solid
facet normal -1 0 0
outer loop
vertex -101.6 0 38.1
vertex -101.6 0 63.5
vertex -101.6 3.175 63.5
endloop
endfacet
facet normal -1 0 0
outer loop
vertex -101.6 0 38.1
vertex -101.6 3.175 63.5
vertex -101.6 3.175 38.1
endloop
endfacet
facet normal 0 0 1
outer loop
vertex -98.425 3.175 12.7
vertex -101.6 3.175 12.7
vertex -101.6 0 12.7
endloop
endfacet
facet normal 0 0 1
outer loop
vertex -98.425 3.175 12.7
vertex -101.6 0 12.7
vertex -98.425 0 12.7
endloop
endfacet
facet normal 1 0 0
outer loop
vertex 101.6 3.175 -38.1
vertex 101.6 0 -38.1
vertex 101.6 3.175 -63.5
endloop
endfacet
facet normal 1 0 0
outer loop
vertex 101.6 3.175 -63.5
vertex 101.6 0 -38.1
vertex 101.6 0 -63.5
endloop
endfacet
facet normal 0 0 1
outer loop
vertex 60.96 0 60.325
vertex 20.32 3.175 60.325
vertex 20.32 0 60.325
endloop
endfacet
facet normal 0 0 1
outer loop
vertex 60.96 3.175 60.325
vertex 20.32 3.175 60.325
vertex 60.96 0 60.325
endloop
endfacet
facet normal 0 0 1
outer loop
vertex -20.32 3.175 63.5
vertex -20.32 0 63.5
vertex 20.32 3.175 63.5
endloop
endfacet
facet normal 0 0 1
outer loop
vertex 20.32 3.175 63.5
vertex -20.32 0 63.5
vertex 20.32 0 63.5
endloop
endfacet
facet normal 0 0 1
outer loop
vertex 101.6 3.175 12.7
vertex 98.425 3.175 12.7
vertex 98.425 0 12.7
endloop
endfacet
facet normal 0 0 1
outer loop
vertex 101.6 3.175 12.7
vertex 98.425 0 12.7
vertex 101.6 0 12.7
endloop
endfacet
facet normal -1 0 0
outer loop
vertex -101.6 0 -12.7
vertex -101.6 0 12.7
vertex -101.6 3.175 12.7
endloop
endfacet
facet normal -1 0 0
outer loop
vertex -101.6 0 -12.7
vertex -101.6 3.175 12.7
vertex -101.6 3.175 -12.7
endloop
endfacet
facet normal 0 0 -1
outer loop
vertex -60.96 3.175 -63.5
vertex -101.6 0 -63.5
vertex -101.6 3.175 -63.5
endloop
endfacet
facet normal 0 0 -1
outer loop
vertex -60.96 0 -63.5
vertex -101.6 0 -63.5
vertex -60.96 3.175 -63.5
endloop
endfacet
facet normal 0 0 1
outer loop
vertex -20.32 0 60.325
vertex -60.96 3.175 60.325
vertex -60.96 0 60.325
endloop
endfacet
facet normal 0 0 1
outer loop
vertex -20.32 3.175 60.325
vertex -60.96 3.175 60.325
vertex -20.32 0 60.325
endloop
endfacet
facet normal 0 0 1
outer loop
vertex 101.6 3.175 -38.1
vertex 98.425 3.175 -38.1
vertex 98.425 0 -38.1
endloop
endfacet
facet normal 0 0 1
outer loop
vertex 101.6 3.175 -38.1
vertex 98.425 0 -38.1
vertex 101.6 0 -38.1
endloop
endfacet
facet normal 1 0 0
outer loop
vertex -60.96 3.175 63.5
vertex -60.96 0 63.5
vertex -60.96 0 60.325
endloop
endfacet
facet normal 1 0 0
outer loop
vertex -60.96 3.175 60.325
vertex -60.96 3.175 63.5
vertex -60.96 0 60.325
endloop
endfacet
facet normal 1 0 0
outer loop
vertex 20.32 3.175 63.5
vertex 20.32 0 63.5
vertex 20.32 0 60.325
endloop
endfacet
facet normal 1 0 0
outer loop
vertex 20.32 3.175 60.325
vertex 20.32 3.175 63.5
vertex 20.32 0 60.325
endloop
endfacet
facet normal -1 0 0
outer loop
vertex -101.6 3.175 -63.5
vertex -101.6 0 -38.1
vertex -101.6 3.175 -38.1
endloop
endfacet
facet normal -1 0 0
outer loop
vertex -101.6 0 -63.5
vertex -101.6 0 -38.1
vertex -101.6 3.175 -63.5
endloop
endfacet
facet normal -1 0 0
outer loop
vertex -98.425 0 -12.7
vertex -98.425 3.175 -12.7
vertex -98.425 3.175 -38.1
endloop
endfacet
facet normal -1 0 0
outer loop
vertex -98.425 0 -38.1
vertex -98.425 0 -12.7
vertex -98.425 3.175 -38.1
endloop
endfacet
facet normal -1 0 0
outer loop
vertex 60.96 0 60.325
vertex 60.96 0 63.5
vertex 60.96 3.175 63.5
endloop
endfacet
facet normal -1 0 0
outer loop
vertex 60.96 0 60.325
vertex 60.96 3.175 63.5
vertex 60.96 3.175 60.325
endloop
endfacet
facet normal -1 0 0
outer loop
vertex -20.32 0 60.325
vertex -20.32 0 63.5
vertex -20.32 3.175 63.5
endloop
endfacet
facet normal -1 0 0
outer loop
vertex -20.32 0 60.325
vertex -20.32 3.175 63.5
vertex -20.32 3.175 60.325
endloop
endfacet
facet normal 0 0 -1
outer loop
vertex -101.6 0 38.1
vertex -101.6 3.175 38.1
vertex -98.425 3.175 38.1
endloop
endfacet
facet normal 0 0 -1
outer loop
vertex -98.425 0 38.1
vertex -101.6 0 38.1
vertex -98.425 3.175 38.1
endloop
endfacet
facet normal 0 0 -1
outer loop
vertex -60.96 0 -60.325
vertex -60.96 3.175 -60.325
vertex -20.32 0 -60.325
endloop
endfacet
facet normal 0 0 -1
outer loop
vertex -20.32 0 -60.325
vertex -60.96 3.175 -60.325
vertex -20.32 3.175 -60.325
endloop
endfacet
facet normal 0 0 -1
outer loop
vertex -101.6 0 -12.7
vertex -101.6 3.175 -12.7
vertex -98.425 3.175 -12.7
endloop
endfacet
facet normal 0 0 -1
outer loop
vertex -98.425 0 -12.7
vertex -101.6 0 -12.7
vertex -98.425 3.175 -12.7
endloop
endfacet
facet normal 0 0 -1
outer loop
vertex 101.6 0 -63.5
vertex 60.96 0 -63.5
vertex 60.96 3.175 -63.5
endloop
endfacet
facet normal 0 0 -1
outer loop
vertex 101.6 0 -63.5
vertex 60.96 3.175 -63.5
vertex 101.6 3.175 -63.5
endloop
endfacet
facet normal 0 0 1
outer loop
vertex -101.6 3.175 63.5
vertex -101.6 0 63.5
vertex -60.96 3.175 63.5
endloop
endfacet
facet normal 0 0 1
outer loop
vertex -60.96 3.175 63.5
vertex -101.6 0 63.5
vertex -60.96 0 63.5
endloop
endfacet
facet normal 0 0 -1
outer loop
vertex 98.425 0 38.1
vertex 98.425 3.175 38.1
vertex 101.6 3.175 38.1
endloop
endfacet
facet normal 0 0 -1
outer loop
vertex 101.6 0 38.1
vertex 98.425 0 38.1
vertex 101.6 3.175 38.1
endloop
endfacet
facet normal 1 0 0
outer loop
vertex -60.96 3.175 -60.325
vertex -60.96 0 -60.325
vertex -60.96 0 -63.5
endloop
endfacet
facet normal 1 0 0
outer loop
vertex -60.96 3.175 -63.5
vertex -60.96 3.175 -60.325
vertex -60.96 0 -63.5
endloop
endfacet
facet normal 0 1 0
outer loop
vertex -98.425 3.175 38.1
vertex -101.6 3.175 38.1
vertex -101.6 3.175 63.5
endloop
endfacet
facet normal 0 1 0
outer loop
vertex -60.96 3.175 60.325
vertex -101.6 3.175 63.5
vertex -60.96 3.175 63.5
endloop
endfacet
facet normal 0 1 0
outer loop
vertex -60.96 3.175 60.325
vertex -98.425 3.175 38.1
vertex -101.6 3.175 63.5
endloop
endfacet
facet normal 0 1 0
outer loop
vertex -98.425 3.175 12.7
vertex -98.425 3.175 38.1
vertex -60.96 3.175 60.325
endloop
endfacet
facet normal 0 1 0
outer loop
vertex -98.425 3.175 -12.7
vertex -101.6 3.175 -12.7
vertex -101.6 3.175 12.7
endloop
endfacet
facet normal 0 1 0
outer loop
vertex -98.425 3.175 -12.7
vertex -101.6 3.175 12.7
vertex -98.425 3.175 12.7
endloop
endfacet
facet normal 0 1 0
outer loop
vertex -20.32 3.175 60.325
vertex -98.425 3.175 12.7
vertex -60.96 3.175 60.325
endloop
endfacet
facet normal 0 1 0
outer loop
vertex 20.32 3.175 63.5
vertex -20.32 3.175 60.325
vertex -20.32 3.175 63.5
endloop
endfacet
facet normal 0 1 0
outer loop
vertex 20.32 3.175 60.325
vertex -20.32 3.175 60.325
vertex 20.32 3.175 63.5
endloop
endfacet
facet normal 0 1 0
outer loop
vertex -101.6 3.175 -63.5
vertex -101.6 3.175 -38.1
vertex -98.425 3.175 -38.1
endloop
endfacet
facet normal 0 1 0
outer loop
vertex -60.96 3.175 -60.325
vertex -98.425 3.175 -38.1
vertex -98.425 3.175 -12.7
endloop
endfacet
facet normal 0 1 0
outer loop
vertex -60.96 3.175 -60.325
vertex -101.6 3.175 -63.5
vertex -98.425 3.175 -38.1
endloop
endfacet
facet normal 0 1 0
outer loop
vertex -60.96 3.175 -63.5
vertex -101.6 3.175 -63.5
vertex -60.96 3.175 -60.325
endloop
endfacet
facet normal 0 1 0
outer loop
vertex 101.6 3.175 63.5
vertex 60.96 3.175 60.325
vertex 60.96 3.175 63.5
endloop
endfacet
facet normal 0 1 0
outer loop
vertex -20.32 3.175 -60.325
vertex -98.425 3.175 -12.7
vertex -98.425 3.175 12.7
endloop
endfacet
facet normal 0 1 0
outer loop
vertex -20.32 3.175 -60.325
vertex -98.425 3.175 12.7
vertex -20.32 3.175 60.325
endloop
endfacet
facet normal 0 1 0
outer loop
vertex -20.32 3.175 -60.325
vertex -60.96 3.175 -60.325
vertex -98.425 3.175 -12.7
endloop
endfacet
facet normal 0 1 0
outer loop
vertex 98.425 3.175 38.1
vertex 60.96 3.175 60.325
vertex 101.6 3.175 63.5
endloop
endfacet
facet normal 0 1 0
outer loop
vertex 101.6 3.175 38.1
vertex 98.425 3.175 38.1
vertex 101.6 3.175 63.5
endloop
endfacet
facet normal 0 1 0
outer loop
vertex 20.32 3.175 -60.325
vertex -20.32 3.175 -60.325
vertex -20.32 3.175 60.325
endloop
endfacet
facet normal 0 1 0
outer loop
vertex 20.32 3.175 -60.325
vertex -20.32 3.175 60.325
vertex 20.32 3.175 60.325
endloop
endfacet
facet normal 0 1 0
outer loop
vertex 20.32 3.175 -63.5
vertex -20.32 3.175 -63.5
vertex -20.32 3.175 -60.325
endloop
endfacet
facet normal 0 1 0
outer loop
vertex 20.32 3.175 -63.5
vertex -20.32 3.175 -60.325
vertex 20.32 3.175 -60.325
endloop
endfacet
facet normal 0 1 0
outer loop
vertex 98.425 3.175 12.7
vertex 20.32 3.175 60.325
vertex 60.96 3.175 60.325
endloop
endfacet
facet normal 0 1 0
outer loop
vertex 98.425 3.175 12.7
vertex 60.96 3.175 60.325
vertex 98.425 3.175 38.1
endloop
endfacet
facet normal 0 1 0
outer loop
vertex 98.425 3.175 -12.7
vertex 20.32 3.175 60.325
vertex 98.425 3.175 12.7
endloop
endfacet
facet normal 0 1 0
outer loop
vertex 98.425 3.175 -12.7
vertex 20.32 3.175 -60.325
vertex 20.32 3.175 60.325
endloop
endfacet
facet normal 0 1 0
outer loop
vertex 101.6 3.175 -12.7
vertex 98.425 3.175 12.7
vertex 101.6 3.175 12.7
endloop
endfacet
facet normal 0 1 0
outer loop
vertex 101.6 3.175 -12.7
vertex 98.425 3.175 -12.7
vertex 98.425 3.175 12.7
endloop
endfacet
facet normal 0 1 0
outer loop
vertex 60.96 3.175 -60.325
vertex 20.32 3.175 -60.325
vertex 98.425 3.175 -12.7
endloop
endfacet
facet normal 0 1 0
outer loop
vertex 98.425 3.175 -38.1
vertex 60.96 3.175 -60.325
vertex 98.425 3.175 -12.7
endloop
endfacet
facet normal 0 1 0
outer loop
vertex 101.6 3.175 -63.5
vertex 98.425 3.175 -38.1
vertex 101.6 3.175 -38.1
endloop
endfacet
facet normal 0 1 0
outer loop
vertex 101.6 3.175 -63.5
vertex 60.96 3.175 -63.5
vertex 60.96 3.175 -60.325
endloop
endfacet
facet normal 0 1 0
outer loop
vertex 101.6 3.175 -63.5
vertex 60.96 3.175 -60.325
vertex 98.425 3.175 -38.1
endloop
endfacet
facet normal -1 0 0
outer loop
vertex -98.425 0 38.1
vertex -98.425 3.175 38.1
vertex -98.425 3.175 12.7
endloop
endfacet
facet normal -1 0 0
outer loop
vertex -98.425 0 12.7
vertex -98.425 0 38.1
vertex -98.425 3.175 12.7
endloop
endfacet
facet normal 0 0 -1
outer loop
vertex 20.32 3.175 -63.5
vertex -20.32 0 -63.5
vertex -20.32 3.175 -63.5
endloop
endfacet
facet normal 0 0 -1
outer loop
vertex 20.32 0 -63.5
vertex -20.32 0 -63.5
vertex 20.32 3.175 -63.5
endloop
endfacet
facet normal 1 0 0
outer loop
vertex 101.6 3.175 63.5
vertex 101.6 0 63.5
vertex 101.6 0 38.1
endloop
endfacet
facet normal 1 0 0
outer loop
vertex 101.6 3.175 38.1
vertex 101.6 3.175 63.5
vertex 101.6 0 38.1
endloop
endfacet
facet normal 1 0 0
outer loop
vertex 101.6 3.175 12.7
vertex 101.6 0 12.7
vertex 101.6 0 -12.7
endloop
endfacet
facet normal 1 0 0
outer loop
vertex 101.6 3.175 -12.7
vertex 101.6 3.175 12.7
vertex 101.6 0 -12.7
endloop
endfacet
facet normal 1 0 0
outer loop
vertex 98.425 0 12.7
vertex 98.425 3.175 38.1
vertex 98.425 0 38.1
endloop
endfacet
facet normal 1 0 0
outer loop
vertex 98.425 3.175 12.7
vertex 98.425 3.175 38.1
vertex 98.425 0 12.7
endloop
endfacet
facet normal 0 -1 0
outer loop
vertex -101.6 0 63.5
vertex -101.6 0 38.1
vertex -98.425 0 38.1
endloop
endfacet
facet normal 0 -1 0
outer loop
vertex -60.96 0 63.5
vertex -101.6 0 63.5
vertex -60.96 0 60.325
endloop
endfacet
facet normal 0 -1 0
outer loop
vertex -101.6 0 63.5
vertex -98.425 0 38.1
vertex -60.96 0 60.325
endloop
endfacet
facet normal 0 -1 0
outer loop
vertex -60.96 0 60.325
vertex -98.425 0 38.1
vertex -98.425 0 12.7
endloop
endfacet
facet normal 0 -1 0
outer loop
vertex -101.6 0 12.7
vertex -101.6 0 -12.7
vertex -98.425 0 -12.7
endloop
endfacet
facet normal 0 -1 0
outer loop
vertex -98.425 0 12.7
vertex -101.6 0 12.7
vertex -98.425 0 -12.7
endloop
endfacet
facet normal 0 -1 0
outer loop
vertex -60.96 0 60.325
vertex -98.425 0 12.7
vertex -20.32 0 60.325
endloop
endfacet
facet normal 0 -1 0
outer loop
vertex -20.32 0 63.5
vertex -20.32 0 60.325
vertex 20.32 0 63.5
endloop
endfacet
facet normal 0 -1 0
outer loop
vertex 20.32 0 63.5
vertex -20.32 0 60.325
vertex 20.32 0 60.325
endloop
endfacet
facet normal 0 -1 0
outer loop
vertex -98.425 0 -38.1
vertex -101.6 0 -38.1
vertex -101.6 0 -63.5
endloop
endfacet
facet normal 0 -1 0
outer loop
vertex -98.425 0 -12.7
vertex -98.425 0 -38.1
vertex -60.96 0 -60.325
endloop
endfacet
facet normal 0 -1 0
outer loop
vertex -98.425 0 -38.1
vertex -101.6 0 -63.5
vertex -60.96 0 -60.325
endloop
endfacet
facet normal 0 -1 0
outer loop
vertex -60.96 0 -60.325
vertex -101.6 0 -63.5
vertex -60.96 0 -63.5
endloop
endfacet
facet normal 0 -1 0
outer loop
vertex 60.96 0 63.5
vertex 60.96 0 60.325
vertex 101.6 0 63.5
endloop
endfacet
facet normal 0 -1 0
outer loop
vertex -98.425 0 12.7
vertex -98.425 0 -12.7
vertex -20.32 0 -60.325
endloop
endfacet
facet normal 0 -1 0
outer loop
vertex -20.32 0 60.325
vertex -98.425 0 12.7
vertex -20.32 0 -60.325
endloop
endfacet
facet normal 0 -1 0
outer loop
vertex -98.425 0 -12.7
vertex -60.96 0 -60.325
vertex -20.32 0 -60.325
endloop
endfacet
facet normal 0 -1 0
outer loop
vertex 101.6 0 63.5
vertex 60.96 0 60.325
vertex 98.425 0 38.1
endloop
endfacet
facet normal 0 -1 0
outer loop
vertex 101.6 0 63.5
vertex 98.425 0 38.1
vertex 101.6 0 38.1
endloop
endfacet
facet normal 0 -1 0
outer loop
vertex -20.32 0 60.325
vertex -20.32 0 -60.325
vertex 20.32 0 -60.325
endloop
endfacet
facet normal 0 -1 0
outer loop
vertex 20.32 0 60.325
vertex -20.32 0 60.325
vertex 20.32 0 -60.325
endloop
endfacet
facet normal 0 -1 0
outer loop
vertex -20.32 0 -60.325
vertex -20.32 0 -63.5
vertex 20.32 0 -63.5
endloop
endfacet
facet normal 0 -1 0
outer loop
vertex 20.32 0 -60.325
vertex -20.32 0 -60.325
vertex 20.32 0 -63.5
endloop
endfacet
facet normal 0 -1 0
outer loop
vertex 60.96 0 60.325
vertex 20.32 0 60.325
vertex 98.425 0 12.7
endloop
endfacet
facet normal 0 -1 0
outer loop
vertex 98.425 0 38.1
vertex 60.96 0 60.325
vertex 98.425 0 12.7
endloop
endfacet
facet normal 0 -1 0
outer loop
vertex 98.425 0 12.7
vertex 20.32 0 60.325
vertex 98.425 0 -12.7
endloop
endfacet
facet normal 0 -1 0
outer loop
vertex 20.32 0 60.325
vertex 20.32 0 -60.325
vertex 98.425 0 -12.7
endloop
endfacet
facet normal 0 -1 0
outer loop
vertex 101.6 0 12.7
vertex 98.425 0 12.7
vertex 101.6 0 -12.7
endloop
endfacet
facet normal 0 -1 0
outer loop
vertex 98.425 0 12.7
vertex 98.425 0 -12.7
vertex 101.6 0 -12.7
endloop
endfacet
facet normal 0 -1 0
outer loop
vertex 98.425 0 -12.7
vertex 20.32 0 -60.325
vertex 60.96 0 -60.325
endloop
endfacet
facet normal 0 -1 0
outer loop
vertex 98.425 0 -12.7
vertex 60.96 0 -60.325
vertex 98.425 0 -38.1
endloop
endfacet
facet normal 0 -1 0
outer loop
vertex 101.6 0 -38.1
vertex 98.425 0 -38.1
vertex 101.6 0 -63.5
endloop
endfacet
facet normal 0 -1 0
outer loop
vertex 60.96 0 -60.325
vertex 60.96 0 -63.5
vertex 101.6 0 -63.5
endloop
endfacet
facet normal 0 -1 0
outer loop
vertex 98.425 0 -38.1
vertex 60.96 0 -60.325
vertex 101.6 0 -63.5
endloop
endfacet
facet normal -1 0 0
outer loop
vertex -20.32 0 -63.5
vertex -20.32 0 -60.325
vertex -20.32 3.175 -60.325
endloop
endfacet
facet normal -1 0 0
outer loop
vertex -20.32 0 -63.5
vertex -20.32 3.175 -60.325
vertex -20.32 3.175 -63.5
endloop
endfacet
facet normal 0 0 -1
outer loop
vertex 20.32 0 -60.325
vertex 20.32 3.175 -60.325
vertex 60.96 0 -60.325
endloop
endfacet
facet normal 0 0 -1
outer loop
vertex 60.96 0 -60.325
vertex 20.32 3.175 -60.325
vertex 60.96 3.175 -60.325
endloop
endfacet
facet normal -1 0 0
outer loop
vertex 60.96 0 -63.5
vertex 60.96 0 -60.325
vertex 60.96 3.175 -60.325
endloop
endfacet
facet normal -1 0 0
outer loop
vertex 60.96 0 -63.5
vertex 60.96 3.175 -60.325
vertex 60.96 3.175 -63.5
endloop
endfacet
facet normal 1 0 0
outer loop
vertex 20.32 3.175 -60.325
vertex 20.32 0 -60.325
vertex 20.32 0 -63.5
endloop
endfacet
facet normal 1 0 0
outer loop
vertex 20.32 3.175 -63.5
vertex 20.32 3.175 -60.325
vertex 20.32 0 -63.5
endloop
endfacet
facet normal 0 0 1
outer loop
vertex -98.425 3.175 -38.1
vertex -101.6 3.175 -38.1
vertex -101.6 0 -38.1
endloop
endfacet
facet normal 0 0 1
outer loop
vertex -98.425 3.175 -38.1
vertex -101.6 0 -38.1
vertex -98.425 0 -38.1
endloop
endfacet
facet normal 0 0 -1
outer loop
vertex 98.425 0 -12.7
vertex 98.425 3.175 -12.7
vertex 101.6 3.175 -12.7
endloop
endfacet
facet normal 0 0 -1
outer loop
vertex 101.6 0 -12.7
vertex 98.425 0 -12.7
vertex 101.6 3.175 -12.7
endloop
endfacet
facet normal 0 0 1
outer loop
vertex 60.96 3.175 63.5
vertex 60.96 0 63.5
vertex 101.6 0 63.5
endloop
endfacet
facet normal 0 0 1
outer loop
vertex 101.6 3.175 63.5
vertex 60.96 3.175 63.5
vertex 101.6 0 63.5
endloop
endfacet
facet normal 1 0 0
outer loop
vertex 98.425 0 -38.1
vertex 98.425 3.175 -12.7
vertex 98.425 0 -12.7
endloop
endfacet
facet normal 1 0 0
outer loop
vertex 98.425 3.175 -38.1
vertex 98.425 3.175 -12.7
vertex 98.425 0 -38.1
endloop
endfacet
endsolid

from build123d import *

# Parameters (mm, degrees)
SKETCH1_W           = 203.2
SKETCH1_H           = 127
BOSS_EXTRUDE1_DEPTH = 3.175
SKETCH3_W           = 40.64
SKETCH3_H           = 3.175
CUT_EXTRUDE1_DEPTH  = 3.175
LPATTERN1_COUNT     = 2
LPATTERN1_PITCH     = 81.28
SKETCH5_W           = 40.64
SKETCH5_H           = 3.175
CUT_EXTRUDE2_DEPTH  = 3.175
LPATTERN2_COUNT     = 2
LPATTERN2_PITCH     = 81.28
SKETCH6_W           = 3.175
SKETCH6_H           = 25.4
CUT_EXTRUDE3_DEPTH  = 3.175
LPATTERN3_COUNT     = 2
LPATTERN3_PITCH     = 50.8
SKETCH7_W           = 3.175
SKETCH7_H           = 25.4
CUT_EXTRUDE4_DEPTH  = 3.175
LPATTERN4_COUNT     = 2
LPATTERN4_PITCH     = 50.8


with BuildPart() as part:
    # Sketch1 → Boss-Extrude1 (new body)
    with BuildSketch(Plane(origin=(0, 0, 0), x_dir=(1, 0, 0), z_dir=(0, 1, 0))):
        Rectangle(SKETCH1_W, SKETCH1_H)
    extrude(amount=BOSS_EXTRUDE1_DEPTH)

    # Sketch3 → Cut-Extrude1 (cut)
    with BuildSketch(Plane(origin=(0, 3.175, 0), x_dir=(1, 0, 0), z_dir=(0, 1, 0))):
        with Locations((-40.64, -61.9125)):
            Rectangle(SKETCH3_W, SKETCH3_H)
    cut_extrude1 = extrude(amount=-CUT_EXTRUDE1_DEPTH, mode=Mode.SUBTRACT)

    # LPattern1: Cut-Extrude1 ×2
    with Locations(*[(i * LPATTERN1_PITCH, 0, 0) for i in range(1, LPATTERN1_COUNT)]):
        add(cut_extrude1, mode=Mode.SUBTRACT)

    # Sketch5 → Cut-Extrude2 (cut)
    with BuildSketch(Plane(origin=(0, 3.175, 0), x_dir=(1, 0, 0), z_dir=(0, 1, 0))):
        with Locations((-40.64, 61.9125)):
            Rectangle(SKETCH5_W, SKETCH5_H)
    cut_extrude2 = extrude(amount=-CUT_EXTRUDE2_DEPTH, mode=Mode.SUBTRACT)

    # LPattern2: Cut-Extrude2 ×2
    with Locations(*[(i * LPATTERN2_PITCH, 0, 0) for i in range(1, LPATTERN2_COUNT)]):
        add(cut_extrude2, mode=Mode.SUBTRACT)

    # Sketch6 → Cut-Extrude3 (cut)
    with BuildSketch(Plane(origin=(0, 3.175, 0), x_dir=(1, 0, 0), z_dir=(0, 1, 0))):
        with Locations((-100.0125, -25.4)):
            Rectangle(SKETCH6_W, SKETCH6_H)
    cut_extrude3 = extrude(amount=-CUT_EXTRUDE3_DEPTH, mode=Mode.SUBTRACT)

    # LPattern3: Cut-Extrude3 ×2
    with Locations(*[(0, 0, -i * LPATTERN3_PITCH) for i in range(1, LPATTERN3_COUNT)]):
        add(cut_extrude3, mode=Mode.SUBTRACT)

    # Sketch7 → Cut-Extrude4 (cut)
    with BuildSketch(Plane(origin=(0, 3.175, 0), x_dir=(1, 0, 0), z_dir=(0, 1, 0))):
        with Locations((100.0125, -25.4)):
            Rectangle(SKETCH7_W, SKETCH7_H)
    cut_extrude4 = extrude(amount=-CUT_EXTRUDE4_DEPTH, mode=Mode.SUBTRACT)

    # LPattern4: Cut-Extrude4 ×2
    with Locations(*[(0, 0, -i * LPATTERN4_PITCH) for i in range(1, LPATTERN4_COUNT)]):
        add(cut_extrude4, mode=Mode.SUBTRACT)


solid = part.part
